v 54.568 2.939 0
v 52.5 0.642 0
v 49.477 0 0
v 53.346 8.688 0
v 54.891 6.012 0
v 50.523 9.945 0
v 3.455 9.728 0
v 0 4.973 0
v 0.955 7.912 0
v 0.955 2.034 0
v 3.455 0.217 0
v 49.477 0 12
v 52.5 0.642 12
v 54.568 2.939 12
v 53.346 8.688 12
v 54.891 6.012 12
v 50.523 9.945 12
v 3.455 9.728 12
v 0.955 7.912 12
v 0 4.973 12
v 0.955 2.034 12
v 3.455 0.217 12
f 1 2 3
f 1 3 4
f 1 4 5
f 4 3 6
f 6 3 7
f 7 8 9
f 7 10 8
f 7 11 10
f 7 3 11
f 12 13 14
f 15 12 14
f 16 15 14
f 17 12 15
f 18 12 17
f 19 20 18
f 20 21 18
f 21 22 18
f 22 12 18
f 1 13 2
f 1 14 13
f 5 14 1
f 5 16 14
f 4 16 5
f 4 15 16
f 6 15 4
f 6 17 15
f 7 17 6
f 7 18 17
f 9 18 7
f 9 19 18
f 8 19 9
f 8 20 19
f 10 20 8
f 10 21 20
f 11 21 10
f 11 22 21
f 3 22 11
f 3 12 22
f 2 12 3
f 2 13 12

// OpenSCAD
$fn = 32;

// ----------------------------------------------------------------------
// Lever arm: two bosses 10 and 10 mm, 45 mm between centres
// ----------------------------------------------------------------------

// --- parameters (mm) ---
profile_height = 12;      // extrusion height
profile_points = 11;      // points of the closed outline

profile = [[0, 4.973], [0.955, 2.034], [3.455, 0.217], [49.477, 0], [52.5, 0.642], [54.568, 2.939], [54.891, 6.012], [53.346, 8.688], [50.523, 9.945], [3.455, 9.728], [0.955, 7.912]];  // single closed polygon, 11 points, counter clockwise

// --- the one profile operation ---
linear_extrude(height = profile_height) polygon(points = profile);
